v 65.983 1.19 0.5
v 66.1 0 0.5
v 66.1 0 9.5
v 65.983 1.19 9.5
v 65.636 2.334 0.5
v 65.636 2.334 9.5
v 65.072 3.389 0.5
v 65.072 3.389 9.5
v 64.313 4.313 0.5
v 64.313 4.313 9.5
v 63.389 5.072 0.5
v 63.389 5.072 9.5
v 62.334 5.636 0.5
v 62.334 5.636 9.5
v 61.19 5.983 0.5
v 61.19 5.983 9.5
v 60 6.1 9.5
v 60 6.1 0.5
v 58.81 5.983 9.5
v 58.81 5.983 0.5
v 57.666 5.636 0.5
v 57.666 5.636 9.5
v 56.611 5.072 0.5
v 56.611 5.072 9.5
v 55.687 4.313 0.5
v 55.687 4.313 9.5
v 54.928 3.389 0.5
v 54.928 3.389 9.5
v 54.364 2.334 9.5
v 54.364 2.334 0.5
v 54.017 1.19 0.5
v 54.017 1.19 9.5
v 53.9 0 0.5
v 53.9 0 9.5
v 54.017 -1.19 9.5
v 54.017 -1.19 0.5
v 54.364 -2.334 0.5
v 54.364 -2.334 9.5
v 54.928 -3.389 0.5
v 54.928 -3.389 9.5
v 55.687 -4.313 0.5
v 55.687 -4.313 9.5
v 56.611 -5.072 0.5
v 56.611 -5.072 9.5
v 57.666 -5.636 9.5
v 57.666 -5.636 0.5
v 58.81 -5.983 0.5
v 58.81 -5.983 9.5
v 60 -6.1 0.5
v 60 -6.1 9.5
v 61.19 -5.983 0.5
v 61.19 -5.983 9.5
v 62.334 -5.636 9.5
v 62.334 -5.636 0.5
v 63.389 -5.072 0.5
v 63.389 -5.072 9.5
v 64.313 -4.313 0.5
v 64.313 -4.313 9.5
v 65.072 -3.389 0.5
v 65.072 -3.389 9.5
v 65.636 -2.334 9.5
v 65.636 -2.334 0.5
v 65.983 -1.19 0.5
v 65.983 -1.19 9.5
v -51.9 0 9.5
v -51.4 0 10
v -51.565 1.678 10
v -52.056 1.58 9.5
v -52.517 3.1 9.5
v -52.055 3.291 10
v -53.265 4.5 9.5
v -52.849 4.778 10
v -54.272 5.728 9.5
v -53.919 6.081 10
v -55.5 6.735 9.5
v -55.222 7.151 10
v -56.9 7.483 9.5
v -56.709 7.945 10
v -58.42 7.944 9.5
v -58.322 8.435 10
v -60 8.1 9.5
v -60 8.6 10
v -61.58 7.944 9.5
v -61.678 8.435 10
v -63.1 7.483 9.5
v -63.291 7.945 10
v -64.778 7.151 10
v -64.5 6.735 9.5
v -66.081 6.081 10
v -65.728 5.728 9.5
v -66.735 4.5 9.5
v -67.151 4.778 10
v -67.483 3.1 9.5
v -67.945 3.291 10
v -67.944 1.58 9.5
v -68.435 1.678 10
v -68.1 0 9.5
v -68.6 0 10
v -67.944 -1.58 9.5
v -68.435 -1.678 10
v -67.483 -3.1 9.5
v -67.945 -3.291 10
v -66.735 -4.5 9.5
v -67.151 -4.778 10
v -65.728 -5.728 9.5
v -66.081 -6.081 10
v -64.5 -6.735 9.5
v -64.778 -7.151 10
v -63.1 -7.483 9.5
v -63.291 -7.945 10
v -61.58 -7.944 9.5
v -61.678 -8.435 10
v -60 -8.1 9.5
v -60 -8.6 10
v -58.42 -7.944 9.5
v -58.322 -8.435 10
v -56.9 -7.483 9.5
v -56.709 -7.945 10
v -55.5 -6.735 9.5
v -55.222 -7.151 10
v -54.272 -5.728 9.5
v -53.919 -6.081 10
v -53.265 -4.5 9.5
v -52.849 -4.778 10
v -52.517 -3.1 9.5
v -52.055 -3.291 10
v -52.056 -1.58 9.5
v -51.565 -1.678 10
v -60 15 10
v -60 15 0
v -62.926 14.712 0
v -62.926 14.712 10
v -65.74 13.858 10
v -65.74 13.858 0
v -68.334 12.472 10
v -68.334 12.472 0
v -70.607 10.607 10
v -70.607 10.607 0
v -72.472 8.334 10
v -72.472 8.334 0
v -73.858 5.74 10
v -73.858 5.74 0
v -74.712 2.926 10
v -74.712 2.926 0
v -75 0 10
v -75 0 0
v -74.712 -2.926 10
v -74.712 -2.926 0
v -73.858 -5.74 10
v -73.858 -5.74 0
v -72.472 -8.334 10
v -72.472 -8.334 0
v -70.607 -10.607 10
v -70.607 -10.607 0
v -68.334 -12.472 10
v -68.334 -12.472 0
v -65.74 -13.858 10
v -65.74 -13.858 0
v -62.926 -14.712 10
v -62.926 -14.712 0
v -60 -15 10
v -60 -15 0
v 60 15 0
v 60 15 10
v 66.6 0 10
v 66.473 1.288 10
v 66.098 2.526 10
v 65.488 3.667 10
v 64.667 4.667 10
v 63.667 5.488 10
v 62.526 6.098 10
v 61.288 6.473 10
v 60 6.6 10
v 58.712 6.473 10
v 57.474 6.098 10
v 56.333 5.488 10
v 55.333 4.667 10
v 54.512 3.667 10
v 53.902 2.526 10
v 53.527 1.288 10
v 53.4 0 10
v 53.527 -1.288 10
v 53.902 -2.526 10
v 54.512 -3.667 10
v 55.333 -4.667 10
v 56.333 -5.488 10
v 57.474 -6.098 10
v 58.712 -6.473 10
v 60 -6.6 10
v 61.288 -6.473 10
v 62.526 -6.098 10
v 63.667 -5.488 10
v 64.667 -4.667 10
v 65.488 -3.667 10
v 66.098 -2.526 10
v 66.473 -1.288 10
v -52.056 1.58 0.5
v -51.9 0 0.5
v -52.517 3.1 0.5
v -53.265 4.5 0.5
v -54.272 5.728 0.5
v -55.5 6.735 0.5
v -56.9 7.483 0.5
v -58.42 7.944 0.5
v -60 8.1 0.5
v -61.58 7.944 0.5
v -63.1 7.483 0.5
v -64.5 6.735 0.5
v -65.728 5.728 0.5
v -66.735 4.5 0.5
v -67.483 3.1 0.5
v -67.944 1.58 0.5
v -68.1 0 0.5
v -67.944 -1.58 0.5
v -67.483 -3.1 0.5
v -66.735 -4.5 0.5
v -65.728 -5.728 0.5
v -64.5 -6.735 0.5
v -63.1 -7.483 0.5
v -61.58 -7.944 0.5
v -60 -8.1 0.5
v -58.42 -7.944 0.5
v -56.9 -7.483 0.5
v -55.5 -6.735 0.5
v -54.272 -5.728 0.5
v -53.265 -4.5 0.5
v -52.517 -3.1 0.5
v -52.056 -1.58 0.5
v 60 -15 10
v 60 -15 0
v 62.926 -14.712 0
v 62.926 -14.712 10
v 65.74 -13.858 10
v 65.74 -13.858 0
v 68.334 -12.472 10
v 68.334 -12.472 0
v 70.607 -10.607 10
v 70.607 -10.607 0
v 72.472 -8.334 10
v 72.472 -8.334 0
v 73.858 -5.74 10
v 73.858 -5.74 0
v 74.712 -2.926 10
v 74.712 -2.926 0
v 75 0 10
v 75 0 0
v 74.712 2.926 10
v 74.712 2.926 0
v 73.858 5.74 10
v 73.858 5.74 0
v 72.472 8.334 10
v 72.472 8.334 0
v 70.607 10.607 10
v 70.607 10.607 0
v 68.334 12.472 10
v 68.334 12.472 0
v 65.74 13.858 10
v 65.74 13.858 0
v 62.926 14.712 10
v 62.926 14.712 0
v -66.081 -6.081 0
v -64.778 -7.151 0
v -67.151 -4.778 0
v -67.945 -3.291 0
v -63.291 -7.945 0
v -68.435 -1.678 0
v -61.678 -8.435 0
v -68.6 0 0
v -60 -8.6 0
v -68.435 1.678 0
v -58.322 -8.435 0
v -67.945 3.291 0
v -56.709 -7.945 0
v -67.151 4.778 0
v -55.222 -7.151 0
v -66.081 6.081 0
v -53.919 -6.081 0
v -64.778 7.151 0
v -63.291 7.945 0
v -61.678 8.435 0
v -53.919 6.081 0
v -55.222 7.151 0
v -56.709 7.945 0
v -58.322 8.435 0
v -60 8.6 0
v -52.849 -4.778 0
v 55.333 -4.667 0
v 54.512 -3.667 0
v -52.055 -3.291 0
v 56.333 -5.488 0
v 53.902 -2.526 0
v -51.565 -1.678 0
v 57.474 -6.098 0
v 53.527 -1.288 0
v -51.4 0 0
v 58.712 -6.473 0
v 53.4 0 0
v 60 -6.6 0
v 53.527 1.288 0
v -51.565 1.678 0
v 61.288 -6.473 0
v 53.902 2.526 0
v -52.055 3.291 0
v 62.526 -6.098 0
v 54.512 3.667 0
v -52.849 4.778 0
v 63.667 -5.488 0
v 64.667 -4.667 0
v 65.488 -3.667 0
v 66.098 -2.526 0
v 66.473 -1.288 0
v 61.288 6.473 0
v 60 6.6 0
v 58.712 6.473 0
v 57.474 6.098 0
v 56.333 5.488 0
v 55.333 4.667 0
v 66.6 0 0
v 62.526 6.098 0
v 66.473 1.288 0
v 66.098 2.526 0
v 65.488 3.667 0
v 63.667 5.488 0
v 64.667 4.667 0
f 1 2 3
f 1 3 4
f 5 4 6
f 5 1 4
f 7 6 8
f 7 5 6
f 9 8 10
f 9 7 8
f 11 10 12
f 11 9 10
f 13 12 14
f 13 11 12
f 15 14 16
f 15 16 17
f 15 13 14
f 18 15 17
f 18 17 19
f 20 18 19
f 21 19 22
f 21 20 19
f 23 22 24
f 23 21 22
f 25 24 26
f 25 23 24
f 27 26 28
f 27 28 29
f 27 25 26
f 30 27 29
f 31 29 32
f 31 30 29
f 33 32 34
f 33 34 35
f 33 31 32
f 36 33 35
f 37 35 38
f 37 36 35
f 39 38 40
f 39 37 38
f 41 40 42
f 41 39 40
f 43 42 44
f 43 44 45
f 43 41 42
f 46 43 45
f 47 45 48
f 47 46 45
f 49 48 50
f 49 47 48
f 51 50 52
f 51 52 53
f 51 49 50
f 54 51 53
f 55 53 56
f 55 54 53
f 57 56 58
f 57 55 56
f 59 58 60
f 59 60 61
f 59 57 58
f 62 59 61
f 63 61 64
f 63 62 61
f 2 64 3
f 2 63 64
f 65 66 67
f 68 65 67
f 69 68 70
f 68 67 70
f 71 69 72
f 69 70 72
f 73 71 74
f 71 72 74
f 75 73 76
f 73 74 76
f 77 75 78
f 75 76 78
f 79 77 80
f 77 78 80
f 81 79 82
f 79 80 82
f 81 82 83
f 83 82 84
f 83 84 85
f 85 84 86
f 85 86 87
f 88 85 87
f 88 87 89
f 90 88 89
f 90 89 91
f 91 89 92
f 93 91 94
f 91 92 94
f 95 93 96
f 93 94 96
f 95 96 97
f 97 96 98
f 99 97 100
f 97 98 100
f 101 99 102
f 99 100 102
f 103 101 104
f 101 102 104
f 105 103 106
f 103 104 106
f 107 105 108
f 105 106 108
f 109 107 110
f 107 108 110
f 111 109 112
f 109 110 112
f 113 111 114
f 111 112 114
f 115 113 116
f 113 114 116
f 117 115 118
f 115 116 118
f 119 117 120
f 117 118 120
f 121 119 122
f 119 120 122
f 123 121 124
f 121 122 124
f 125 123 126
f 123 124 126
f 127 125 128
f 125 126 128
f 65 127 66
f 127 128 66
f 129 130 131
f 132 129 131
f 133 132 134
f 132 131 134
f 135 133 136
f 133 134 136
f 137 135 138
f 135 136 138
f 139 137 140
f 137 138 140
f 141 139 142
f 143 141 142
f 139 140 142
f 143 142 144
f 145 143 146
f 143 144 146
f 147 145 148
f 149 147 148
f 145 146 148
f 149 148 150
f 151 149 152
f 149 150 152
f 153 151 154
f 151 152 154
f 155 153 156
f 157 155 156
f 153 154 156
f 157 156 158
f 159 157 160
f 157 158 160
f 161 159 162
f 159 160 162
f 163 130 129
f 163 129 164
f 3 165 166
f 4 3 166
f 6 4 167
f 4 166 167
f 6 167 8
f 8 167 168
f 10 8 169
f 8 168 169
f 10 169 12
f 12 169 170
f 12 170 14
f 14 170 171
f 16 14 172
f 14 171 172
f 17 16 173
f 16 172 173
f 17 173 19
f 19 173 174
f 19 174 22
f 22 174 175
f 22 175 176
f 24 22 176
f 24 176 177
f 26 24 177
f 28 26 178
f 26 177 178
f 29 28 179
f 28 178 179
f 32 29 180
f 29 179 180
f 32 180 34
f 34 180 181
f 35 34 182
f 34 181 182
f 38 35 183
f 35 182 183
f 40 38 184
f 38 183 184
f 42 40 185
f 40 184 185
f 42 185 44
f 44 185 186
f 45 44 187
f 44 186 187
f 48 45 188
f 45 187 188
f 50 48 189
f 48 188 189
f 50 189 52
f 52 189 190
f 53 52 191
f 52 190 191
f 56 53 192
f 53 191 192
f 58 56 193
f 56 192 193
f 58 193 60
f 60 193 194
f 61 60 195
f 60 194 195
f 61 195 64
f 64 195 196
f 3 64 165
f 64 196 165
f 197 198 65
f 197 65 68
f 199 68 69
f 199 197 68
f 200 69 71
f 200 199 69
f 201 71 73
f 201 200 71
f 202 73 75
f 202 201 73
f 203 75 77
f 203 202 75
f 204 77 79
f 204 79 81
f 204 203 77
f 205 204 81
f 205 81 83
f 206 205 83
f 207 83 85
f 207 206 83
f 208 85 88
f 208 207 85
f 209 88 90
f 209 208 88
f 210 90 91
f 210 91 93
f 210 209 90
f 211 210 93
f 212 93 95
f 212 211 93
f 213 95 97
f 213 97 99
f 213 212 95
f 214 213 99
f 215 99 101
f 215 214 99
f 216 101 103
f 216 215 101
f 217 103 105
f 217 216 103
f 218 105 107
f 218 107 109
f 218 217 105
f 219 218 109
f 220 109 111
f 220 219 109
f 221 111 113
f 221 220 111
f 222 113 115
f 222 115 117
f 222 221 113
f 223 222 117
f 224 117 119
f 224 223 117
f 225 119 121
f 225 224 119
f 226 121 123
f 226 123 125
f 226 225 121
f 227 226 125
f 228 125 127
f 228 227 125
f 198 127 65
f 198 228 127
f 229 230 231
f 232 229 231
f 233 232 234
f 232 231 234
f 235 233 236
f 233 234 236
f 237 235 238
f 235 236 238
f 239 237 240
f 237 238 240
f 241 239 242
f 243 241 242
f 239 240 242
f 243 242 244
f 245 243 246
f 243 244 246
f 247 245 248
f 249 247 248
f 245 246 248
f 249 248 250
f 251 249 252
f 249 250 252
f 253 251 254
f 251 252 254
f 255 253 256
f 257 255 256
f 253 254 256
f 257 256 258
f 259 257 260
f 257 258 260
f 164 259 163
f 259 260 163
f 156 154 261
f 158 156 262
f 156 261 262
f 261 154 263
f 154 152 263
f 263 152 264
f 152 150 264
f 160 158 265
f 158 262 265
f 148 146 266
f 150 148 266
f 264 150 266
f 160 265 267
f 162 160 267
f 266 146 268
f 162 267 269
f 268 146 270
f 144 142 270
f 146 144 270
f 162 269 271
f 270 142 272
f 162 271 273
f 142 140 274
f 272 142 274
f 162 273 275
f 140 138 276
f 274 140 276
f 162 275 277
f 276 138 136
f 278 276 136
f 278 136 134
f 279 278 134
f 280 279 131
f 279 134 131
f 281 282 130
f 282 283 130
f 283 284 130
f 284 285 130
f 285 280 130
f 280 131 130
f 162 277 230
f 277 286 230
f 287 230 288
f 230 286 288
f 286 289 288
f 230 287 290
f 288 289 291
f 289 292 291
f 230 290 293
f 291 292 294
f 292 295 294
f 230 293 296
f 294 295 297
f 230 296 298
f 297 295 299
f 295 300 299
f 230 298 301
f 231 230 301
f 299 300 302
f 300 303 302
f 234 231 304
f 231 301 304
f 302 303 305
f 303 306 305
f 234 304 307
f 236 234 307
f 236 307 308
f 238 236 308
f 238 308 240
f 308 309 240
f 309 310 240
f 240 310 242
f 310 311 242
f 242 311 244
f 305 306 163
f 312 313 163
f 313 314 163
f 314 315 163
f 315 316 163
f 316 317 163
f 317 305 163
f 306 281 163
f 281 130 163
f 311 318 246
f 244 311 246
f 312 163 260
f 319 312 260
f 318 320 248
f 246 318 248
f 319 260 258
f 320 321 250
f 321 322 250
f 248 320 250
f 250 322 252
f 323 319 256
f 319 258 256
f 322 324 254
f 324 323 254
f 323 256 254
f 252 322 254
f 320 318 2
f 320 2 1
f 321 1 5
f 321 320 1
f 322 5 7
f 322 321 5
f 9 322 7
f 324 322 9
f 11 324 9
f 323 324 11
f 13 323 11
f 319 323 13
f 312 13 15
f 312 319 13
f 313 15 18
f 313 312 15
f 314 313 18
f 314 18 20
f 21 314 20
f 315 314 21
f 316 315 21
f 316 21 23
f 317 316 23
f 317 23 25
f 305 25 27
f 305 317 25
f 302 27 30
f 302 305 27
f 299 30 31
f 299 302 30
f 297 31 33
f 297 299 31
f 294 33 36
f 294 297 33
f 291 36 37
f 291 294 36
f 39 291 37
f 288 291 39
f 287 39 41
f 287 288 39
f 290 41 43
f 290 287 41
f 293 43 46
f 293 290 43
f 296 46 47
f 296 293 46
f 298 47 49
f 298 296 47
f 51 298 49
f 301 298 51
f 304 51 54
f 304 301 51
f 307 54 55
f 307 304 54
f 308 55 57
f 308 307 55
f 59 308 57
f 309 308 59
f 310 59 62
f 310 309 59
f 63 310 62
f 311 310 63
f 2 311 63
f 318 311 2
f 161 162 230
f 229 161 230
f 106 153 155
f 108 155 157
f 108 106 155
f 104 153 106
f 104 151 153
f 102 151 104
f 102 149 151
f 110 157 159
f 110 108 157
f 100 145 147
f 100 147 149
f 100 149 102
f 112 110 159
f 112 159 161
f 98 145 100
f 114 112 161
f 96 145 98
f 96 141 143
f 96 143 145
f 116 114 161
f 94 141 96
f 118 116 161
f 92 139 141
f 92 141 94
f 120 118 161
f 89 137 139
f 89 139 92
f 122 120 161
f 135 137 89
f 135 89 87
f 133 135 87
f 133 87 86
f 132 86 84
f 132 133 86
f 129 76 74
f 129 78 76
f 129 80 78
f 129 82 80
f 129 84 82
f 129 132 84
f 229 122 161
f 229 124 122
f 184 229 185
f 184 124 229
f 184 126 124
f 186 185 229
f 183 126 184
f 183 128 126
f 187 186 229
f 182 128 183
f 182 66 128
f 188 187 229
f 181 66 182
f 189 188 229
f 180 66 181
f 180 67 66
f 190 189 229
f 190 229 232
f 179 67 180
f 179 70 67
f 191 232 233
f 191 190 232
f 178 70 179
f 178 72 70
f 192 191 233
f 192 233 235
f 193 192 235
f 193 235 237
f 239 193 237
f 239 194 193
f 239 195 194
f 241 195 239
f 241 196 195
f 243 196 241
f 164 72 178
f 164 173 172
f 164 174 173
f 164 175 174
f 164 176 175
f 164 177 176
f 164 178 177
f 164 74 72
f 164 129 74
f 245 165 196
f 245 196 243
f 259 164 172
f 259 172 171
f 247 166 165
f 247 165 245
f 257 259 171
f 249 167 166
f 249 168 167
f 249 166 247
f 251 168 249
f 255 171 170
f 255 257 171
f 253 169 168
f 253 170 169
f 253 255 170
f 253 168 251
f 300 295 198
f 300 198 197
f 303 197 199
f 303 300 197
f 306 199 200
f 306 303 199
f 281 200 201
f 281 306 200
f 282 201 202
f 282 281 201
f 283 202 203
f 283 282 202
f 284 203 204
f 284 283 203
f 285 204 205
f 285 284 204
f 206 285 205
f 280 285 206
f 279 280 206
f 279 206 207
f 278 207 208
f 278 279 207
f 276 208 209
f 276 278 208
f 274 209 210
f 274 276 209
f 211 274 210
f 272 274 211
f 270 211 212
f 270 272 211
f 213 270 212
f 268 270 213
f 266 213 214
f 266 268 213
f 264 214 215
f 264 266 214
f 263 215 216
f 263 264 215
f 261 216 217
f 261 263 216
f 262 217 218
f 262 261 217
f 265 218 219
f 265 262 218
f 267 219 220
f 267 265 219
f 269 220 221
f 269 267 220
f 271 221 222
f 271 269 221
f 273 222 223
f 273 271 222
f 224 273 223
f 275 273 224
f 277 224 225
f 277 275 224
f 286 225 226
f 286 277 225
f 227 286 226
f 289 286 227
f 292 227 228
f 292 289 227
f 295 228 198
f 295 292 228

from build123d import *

# Parameters (mm, degrees)
SKETCH_R     = 6.1
SKETCH_R_2   = 8.1
PAD_DEPTH    = 10
CHAMFER_SIZE = 0.5


with BuildPart() as part:
    # Sketch → Pad (new body)
    with BuildSketch(Plane.XY):
        with BuildLine():
            ThreePointArc((-60, 15), (-75, 0), (-60, -15))
            Line((-60, -15), (60, -15))
            ThreePointArc((60, -15), (75, 0), (60, 15))
            Line((-60, 15), (60, 15))
        make_face()
        with Locations((60, 0)):
            Circle(SKETCH_R, mode=Mode.SUBTRACT)
        with Locations((-60, 0)):
            Circle(SKETCH_R_2, mode=Mode.SUBTRACT)
    extrude(amount=PAD_DEPTH)

    # Chamfer
    chamfer_edges = [part.edges().sort_by_distance(p)[0] for p in [
        (53.9, 0, 10),
        (-68.1, 0, 10),
        (53.9, 0, 0),
        (-68.1, 0, 0),
    ]]
    chamfer(chamfer_edges, length=CHAMFER_SIZE)


solid = part.part
